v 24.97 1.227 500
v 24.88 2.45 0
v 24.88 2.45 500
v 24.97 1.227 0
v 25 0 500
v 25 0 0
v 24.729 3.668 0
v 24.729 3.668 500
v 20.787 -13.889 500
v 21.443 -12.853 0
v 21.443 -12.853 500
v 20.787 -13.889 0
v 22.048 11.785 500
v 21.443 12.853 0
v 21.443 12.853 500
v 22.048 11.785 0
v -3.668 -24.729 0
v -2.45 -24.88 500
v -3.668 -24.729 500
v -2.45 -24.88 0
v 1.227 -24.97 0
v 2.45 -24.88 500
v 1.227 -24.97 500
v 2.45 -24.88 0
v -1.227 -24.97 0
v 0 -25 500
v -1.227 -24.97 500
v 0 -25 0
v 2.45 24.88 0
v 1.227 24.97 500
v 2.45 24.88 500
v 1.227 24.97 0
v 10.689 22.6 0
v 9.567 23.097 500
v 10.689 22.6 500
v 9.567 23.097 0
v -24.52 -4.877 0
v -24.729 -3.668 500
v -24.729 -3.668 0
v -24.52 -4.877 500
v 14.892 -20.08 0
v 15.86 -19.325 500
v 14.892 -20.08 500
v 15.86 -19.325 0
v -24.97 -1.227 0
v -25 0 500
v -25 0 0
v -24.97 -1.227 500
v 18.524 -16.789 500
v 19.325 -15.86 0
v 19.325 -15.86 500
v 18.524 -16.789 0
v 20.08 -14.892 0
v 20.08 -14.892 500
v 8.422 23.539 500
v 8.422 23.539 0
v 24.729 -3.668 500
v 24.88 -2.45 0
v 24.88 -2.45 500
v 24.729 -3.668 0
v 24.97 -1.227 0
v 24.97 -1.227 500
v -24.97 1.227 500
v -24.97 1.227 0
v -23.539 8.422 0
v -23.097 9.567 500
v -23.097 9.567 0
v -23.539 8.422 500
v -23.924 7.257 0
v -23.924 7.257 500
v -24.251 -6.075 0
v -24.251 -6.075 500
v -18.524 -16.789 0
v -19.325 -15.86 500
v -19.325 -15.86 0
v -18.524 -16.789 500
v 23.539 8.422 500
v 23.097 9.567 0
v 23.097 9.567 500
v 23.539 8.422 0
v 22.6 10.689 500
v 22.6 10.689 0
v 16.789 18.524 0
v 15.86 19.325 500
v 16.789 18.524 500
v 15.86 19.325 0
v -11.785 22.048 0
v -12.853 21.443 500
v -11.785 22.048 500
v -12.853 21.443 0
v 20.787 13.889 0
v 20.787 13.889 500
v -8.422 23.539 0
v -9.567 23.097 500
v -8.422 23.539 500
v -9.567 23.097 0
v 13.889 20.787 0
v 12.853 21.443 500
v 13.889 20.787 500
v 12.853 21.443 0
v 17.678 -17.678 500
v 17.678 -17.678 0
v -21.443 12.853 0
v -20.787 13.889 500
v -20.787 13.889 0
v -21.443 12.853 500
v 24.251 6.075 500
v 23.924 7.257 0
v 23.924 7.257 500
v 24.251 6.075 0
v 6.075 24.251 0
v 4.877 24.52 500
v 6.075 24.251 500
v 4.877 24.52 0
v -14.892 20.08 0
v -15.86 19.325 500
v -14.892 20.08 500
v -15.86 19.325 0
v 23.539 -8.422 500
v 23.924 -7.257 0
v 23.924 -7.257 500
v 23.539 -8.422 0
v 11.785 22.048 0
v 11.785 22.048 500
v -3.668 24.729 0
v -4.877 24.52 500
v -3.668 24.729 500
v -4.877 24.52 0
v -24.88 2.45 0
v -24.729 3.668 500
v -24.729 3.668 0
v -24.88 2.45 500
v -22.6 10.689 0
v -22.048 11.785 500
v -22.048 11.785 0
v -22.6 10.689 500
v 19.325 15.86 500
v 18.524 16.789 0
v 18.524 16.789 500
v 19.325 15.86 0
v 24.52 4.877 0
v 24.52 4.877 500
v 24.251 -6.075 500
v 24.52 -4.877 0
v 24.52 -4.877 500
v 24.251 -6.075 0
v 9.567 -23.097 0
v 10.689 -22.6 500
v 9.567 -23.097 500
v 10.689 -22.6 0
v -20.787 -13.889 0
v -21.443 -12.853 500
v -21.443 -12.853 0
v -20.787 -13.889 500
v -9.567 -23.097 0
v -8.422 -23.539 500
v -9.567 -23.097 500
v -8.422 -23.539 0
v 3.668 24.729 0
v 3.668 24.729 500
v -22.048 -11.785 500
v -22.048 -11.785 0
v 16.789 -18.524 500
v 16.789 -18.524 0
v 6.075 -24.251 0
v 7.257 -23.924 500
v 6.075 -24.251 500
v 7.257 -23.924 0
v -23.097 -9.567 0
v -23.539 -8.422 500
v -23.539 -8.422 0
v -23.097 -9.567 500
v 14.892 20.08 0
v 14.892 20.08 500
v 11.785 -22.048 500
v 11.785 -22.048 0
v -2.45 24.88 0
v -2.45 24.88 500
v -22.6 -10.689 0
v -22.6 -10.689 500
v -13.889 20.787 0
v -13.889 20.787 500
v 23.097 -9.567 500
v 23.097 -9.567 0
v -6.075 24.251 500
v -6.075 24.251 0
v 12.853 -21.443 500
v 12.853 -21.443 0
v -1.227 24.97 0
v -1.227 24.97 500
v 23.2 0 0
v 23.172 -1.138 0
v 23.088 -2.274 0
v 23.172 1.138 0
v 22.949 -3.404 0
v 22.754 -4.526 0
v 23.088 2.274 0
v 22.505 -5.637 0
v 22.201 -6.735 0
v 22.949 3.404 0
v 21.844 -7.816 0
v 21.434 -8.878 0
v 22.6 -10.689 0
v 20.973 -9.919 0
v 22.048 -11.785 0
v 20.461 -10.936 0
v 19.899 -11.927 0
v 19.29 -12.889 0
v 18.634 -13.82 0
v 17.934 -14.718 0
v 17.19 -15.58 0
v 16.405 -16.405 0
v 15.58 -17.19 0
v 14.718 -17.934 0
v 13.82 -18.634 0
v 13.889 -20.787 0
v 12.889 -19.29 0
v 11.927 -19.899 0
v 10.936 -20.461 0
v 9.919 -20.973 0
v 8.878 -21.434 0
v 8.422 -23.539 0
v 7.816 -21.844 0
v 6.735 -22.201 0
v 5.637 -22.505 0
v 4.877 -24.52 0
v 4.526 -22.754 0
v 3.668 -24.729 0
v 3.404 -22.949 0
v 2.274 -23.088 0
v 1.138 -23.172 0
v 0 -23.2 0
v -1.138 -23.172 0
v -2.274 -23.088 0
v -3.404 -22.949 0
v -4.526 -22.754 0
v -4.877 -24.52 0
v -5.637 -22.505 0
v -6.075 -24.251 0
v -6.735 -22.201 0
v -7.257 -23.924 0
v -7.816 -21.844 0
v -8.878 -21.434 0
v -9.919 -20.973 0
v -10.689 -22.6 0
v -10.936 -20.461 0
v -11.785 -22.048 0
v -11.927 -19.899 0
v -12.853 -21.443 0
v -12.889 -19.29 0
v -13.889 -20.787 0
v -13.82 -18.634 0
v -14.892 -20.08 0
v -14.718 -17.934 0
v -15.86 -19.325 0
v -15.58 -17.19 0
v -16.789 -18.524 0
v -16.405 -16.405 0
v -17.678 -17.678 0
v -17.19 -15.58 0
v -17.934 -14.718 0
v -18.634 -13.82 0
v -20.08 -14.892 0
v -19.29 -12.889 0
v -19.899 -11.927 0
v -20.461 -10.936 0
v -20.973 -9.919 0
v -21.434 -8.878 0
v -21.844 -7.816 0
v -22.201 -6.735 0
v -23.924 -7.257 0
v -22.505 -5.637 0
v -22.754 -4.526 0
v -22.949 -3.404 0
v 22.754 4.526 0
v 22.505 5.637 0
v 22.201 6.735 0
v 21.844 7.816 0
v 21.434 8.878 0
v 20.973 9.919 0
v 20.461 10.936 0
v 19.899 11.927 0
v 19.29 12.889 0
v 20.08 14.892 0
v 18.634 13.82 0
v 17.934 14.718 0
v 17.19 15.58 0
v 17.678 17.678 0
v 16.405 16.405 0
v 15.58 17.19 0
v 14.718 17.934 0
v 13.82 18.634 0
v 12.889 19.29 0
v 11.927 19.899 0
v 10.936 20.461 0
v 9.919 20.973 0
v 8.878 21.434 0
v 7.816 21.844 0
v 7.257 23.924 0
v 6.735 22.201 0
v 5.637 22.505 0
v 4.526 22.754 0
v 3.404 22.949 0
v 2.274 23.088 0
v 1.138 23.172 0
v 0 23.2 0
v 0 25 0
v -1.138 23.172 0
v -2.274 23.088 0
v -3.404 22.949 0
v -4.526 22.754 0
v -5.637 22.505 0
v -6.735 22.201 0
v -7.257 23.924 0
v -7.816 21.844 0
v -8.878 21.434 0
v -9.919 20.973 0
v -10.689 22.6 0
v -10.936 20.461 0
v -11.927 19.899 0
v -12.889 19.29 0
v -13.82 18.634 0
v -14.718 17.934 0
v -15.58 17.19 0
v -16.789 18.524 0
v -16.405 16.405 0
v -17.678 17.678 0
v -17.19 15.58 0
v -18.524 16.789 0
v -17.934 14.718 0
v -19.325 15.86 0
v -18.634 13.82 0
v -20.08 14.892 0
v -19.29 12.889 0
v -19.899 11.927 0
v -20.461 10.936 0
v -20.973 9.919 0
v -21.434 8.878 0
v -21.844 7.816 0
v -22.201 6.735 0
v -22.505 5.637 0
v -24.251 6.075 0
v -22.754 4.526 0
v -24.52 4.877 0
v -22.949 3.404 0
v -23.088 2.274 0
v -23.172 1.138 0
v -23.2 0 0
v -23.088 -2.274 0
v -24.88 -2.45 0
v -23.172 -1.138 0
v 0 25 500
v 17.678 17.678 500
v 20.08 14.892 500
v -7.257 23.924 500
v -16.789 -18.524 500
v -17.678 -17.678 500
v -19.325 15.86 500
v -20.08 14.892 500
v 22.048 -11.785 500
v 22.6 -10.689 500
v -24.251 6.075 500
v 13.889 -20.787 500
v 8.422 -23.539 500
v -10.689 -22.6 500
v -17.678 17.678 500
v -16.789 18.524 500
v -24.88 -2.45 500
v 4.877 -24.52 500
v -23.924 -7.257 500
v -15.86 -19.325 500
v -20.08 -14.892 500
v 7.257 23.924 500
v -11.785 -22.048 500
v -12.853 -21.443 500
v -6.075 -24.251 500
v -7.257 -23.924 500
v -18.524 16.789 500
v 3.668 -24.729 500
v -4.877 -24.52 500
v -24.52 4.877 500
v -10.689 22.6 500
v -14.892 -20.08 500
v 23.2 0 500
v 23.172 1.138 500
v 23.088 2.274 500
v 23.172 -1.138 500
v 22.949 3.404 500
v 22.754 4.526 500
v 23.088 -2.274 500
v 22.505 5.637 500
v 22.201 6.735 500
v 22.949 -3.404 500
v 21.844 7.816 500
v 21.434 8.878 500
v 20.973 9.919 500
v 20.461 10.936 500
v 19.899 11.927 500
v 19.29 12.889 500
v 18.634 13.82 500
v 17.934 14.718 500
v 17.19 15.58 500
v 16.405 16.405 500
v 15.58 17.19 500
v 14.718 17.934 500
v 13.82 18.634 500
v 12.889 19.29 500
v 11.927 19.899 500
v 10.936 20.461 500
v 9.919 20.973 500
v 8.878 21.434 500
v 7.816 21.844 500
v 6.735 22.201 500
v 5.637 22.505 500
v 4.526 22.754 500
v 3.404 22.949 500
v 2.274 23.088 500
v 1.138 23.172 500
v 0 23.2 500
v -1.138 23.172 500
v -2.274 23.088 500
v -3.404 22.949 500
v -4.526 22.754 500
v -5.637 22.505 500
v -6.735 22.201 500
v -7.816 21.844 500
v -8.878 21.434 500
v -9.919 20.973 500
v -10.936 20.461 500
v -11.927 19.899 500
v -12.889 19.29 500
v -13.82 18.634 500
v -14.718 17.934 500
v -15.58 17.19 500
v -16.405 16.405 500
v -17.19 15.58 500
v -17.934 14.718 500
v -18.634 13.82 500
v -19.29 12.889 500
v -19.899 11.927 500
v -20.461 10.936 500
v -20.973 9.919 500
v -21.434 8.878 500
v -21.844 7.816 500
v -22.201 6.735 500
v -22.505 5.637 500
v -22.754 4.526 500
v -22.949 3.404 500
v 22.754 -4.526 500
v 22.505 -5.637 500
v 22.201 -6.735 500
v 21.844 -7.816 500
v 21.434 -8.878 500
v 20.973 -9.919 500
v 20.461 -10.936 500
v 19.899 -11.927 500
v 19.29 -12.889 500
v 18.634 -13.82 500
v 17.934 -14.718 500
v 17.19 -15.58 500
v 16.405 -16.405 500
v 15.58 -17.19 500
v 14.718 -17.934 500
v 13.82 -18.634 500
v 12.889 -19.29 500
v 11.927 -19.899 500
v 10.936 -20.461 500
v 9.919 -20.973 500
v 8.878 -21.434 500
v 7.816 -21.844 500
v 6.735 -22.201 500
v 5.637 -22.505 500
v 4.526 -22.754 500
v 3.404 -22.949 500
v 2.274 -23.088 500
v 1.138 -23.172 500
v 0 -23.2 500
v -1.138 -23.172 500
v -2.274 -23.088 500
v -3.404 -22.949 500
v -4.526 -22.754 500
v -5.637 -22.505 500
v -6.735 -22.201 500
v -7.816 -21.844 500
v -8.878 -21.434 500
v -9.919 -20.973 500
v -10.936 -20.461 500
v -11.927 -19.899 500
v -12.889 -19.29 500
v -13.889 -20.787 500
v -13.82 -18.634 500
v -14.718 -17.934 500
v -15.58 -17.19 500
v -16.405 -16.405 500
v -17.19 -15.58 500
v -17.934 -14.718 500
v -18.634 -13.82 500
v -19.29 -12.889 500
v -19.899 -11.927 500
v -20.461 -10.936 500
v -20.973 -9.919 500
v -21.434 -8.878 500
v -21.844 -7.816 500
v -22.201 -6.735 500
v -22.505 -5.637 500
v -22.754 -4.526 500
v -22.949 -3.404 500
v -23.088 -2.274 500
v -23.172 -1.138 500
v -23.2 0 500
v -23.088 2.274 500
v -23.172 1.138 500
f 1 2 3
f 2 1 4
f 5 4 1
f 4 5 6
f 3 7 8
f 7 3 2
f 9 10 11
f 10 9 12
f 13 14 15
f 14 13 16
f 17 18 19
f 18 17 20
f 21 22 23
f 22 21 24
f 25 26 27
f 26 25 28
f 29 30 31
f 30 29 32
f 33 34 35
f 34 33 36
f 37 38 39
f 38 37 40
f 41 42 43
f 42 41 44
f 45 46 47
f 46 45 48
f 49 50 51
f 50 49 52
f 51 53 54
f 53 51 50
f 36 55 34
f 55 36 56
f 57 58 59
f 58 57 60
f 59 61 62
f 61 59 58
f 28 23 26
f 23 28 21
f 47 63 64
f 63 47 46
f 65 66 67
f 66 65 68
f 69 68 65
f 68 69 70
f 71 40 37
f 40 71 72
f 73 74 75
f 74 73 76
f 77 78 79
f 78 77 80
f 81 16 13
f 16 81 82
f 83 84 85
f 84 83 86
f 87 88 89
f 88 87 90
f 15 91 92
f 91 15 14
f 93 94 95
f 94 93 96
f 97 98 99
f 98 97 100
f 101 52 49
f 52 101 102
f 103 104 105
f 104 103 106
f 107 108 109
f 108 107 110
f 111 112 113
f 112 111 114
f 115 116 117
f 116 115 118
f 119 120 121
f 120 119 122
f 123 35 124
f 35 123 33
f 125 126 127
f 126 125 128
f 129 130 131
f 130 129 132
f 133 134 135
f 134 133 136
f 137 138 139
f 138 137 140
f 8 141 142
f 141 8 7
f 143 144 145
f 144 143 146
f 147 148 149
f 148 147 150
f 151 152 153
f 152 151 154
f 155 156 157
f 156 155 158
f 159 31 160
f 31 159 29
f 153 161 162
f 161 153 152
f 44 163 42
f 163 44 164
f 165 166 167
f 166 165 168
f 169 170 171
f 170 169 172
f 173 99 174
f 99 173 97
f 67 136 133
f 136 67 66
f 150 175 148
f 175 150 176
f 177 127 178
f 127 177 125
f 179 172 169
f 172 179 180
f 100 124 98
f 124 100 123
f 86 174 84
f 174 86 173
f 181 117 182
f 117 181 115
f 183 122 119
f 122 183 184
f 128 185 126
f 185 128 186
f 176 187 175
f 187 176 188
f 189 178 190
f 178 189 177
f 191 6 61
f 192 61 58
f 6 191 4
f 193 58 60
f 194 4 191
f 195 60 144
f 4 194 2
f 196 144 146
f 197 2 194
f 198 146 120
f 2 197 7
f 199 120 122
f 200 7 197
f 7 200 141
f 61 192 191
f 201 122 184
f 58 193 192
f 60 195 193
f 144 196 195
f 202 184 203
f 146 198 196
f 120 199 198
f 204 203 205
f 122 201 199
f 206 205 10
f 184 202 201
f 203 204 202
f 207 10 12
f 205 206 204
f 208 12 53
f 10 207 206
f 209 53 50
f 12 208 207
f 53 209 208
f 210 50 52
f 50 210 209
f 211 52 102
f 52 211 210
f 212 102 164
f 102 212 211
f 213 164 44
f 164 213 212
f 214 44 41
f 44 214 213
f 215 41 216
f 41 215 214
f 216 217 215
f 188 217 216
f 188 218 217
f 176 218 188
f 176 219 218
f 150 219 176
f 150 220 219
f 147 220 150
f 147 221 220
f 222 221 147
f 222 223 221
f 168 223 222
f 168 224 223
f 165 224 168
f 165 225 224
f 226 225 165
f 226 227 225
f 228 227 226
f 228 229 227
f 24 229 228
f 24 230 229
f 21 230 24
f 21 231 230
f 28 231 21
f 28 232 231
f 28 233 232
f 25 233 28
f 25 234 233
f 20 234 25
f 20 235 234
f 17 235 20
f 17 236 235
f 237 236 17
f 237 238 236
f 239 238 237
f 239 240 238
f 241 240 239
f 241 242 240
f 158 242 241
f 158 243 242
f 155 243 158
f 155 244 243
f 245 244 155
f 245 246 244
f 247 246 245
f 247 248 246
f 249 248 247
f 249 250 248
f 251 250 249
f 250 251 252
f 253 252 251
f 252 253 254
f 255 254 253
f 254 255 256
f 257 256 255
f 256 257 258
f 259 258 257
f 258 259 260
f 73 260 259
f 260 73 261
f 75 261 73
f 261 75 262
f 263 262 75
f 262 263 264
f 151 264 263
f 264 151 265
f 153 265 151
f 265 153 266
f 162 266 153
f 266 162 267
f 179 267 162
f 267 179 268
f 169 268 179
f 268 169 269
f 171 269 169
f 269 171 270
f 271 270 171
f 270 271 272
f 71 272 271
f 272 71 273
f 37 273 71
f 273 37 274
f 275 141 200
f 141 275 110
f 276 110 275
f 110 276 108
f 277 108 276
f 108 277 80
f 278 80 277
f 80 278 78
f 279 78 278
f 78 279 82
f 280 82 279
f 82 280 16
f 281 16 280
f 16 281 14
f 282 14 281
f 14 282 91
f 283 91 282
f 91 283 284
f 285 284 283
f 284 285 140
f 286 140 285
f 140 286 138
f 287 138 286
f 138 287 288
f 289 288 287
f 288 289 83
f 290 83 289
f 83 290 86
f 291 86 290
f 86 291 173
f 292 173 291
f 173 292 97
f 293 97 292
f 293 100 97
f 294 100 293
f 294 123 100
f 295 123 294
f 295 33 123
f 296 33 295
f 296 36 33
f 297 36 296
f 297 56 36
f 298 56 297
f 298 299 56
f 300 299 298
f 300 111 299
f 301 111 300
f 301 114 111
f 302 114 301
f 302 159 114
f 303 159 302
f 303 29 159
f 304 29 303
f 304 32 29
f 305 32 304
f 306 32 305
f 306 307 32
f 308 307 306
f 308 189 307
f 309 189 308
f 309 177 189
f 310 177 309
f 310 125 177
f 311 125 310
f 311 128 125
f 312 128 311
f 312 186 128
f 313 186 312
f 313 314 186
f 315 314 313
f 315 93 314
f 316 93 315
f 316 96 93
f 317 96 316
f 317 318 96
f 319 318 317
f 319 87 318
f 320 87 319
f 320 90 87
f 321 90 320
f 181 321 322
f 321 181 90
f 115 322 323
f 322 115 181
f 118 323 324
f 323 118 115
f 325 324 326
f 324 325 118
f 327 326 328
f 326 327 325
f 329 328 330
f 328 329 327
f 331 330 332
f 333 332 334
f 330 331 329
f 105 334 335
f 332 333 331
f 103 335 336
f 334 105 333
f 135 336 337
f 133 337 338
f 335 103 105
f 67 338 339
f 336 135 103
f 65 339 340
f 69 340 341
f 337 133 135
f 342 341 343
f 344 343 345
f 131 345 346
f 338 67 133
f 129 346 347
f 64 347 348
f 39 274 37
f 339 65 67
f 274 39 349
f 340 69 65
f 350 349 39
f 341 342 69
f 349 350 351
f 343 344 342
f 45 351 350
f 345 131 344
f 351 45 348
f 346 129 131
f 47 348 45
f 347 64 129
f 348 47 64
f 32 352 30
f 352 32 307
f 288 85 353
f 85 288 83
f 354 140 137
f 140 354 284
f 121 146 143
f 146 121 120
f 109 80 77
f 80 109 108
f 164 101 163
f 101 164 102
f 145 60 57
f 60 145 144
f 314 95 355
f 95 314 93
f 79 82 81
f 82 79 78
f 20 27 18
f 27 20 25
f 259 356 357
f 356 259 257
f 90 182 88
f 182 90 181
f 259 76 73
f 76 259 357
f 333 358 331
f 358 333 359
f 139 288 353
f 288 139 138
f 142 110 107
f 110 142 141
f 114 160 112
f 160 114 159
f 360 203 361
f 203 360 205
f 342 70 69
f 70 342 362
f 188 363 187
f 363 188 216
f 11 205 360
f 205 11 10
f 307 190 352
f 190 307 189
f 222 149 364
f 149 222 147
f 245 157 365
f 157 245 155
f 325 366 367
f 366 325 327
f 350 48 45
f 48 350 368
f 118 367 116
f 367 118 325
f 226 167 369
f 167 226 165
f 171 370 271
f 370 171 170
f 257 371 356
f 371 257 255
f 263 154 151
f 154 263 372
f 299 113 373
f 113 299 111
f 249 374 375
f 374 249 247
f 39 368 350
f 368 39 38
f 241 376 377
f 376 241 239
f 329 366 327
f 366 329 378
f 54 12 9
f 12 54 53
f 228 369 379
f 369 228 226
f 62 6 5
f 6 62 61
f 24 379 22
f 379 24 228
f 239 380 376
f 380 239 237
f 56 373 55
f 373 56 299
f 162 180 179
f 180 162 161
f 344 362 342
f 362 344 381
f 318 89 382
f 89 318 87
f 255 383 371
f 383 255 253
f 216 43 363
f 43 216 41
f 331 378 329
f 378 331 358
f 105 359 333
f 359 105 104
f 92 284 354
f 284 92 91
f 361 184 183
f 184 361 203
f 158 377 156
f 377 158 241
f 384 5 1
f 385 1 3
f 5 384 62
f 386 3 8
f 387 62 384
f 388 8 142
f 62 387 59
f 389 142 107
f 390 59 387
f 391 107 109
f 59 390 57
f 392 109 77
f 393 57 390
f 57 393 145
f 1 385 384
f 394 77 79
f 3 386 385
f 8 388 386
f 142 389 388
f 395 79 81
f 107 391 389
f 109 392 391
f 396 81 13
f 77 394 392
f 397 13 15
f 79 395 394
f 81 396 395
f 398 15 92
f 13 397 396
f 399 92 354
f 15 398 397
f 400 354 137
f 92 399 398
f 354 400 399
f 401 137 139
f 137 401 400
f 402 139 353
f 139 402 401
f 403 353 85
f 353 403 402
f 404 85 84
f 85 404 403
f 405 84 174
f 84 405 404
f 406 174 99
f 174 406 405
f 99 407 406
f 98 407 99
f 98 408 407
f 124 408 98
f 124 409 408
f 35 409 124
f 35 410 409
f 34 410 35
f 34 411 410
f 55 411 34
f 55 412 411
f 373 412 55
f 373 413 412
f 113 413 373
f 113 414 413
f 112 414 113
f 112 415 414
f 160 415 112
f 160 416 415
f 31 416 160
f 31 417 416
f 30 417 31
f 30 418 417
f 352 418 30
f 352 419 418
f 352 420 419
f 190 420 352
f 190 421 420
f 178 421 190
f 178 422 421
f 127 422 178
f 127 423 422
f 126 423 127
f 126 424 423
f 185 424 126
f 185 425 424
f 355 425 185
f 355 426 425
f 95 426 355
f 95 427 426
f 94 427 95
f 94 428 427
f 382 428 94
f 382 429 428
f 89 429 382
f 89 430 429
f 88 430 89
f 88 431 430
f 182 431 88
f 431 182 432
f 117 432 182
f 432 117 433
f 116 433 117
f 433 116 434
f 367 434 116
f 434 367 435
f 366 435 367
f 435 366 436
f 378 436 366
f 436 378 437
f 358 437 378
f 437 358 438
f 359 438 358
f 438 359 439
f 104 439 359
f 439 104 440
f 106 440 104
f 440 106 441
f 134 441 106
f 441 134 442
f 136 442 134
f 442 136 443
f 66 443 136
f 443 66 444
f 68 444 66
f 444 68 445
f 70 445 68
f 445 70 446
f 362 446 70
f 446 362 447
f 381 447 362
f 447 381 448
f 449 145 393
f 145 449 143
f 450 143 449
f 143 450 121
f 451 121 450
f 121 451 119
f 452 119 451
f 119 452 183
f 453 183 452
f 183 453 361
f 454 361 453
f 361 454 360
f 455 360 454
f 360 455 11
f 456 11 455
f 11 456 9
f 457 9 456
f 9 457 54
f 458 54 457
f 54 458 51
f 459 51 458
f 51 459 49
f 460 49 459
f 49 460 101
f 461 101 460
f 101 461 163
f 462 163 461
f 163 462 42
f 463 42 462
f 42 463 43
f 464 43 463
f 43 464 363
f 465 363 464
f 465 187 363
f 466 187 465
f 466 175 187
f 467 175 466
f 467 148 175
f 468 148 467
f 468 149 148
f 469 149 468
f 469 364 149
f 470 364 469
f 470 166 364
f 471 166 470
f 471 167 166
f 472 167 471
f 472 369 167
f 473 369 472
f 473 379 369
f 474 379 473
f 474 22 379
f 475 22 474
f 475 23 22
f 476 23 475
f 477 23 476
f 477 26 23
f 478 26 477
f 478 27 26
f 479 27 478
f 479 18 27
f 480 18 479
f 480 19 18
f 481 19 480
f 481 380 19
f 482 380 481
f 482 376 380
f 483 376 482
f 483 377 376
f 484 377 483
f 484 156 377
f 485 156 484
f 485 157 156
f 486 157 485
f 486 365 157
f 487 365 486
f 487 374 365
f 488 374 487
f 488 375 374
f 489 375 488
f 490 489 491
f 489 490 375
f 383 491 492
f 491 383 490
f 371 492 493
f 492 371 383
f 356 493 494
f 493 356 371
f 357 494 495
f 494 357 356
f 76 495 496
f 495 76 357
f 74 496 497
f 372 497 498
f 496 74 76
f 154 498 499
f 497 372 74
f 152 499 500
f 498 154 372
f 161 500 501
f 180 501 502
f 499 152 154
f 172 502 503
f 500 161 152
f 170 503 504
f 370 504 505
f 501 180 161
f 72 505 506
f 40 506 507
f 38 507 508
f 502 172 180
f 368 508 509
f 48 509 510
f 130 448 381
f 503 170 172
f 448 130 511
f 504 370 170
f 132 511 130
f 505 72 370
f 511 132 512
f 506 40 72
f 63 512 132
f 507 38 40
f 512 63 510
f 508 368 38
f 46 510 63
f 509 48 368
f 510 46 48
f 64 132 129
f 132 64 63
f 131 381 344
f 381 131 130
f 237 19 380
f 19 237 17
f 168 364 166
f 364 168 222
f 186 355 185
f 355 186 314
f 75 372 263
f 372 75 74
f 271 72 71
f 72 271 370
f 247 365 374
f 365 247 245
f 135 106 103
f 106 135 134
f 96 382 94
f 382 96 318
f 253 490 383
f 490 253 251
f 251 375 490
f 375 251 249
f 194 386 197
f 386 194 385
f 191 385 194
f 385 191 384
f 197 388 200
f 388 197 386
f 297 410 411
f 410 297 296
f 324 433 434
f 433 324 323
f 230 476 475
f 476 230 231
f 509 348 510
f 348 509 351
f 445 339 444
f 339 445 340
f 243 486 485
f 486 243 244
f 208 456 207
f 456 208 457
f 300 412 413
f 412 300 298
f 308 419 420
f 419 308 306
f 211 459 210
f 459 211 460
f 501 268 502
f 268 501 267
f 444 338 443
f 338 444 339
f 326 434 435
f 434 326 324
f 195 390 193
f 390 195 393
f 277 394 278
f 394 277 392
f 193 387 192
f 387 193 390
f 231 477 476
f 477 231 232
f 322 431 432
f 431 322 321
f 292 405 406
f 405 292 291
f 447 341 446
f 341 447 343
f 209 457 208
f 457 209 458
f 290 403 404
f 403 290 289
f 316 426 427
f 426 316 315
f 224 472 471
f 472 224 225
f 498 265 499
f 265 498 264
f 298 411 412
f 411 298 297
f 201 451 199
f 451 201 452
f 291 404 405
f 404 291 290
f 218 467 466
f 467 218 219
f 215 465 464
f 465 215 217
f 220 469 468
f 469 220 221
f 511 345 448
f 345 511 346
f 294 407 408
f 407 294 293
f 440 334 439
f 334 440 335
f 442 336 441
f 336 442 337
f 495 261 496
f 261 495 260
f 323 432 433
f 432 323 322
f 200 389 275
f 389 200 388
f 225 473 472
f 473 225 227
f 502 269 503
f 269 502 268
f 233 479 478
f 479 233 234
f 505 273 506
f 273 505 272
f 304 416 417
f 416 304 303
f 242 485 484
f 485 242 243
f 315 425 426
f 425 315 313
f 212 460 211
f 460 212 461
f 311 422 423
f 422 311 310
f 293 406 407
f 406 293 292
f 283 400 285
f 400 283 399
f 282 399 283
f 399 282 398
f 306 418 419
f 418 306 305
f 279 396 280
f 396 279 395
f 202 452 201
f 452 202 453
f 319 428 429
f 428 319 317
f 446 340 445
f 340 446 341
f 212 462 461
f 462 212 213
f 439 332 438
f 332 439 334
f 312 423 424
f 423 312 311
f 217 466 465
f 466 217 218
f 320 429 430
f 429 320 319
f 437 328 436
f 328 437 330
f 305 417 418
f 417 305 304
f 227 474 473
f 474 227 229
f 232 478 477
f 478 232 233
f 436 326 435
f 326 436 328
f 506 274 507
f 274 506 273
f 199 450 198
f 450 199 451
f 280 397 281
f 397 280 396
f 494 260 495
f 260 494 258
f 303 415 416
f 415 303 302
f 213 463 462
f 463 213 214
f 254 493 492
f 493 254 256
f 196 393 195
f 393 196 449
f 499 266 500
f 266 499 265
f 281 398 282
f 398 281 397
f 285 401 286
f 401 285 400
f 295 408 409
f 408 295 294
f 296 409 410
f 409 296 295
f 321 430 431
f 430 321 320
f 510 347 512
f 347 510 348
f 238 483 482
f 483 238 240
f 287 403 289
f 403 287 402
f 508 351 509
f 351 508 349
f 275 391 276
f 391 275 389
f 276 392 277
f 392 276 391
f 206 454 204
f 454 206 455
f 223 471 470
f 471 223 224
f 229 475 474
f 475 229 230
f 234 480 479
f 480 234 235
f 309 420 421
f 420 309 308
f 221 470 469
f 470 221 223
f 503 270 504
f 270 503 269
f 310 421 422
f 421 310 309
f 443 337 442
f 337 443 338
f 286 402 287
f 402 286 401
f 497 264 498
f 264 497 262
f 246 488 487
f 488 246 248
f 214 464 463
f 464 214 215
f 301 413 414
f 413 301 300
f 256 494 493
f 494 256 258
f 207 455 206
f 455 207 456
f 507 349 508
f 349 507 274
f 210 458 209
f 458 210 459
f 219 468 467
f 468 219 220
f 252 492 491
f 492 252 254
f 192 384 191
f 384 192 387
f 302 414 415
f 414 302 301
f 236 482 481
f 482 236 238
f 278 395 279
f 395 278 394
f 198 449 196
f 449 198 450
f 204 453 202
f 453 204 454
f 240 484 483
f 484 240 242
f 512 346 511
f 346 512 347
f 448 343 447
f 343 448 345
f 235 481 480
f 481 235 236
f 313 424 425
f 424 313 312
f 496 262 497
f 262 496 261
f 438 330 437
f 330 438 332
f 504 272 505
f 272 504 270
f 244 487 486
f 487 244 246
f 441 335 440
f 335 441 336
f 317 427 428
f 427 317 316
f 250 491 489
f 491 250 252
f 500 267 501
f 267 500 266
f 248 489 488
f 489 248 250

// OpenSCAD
$fn = 128;

// HT 50 pipe (approx.): DN 50, length 500 mm
// Typical dimensions (approx. for HT 50):
// Outer diameter: 50 mm
// Wall thickness: 1.8 mm  -> inner diameter: 46.4 mm
// No socket modeled (straight pipe)

length = 500;
od = 50;
wall = 1.8;
id = od - 2*wall;

difference() {
    cylinder(h = length, d = od);
    translate([0,0,-0.5])
        cylinder(h = length + 1, d = id);
}
